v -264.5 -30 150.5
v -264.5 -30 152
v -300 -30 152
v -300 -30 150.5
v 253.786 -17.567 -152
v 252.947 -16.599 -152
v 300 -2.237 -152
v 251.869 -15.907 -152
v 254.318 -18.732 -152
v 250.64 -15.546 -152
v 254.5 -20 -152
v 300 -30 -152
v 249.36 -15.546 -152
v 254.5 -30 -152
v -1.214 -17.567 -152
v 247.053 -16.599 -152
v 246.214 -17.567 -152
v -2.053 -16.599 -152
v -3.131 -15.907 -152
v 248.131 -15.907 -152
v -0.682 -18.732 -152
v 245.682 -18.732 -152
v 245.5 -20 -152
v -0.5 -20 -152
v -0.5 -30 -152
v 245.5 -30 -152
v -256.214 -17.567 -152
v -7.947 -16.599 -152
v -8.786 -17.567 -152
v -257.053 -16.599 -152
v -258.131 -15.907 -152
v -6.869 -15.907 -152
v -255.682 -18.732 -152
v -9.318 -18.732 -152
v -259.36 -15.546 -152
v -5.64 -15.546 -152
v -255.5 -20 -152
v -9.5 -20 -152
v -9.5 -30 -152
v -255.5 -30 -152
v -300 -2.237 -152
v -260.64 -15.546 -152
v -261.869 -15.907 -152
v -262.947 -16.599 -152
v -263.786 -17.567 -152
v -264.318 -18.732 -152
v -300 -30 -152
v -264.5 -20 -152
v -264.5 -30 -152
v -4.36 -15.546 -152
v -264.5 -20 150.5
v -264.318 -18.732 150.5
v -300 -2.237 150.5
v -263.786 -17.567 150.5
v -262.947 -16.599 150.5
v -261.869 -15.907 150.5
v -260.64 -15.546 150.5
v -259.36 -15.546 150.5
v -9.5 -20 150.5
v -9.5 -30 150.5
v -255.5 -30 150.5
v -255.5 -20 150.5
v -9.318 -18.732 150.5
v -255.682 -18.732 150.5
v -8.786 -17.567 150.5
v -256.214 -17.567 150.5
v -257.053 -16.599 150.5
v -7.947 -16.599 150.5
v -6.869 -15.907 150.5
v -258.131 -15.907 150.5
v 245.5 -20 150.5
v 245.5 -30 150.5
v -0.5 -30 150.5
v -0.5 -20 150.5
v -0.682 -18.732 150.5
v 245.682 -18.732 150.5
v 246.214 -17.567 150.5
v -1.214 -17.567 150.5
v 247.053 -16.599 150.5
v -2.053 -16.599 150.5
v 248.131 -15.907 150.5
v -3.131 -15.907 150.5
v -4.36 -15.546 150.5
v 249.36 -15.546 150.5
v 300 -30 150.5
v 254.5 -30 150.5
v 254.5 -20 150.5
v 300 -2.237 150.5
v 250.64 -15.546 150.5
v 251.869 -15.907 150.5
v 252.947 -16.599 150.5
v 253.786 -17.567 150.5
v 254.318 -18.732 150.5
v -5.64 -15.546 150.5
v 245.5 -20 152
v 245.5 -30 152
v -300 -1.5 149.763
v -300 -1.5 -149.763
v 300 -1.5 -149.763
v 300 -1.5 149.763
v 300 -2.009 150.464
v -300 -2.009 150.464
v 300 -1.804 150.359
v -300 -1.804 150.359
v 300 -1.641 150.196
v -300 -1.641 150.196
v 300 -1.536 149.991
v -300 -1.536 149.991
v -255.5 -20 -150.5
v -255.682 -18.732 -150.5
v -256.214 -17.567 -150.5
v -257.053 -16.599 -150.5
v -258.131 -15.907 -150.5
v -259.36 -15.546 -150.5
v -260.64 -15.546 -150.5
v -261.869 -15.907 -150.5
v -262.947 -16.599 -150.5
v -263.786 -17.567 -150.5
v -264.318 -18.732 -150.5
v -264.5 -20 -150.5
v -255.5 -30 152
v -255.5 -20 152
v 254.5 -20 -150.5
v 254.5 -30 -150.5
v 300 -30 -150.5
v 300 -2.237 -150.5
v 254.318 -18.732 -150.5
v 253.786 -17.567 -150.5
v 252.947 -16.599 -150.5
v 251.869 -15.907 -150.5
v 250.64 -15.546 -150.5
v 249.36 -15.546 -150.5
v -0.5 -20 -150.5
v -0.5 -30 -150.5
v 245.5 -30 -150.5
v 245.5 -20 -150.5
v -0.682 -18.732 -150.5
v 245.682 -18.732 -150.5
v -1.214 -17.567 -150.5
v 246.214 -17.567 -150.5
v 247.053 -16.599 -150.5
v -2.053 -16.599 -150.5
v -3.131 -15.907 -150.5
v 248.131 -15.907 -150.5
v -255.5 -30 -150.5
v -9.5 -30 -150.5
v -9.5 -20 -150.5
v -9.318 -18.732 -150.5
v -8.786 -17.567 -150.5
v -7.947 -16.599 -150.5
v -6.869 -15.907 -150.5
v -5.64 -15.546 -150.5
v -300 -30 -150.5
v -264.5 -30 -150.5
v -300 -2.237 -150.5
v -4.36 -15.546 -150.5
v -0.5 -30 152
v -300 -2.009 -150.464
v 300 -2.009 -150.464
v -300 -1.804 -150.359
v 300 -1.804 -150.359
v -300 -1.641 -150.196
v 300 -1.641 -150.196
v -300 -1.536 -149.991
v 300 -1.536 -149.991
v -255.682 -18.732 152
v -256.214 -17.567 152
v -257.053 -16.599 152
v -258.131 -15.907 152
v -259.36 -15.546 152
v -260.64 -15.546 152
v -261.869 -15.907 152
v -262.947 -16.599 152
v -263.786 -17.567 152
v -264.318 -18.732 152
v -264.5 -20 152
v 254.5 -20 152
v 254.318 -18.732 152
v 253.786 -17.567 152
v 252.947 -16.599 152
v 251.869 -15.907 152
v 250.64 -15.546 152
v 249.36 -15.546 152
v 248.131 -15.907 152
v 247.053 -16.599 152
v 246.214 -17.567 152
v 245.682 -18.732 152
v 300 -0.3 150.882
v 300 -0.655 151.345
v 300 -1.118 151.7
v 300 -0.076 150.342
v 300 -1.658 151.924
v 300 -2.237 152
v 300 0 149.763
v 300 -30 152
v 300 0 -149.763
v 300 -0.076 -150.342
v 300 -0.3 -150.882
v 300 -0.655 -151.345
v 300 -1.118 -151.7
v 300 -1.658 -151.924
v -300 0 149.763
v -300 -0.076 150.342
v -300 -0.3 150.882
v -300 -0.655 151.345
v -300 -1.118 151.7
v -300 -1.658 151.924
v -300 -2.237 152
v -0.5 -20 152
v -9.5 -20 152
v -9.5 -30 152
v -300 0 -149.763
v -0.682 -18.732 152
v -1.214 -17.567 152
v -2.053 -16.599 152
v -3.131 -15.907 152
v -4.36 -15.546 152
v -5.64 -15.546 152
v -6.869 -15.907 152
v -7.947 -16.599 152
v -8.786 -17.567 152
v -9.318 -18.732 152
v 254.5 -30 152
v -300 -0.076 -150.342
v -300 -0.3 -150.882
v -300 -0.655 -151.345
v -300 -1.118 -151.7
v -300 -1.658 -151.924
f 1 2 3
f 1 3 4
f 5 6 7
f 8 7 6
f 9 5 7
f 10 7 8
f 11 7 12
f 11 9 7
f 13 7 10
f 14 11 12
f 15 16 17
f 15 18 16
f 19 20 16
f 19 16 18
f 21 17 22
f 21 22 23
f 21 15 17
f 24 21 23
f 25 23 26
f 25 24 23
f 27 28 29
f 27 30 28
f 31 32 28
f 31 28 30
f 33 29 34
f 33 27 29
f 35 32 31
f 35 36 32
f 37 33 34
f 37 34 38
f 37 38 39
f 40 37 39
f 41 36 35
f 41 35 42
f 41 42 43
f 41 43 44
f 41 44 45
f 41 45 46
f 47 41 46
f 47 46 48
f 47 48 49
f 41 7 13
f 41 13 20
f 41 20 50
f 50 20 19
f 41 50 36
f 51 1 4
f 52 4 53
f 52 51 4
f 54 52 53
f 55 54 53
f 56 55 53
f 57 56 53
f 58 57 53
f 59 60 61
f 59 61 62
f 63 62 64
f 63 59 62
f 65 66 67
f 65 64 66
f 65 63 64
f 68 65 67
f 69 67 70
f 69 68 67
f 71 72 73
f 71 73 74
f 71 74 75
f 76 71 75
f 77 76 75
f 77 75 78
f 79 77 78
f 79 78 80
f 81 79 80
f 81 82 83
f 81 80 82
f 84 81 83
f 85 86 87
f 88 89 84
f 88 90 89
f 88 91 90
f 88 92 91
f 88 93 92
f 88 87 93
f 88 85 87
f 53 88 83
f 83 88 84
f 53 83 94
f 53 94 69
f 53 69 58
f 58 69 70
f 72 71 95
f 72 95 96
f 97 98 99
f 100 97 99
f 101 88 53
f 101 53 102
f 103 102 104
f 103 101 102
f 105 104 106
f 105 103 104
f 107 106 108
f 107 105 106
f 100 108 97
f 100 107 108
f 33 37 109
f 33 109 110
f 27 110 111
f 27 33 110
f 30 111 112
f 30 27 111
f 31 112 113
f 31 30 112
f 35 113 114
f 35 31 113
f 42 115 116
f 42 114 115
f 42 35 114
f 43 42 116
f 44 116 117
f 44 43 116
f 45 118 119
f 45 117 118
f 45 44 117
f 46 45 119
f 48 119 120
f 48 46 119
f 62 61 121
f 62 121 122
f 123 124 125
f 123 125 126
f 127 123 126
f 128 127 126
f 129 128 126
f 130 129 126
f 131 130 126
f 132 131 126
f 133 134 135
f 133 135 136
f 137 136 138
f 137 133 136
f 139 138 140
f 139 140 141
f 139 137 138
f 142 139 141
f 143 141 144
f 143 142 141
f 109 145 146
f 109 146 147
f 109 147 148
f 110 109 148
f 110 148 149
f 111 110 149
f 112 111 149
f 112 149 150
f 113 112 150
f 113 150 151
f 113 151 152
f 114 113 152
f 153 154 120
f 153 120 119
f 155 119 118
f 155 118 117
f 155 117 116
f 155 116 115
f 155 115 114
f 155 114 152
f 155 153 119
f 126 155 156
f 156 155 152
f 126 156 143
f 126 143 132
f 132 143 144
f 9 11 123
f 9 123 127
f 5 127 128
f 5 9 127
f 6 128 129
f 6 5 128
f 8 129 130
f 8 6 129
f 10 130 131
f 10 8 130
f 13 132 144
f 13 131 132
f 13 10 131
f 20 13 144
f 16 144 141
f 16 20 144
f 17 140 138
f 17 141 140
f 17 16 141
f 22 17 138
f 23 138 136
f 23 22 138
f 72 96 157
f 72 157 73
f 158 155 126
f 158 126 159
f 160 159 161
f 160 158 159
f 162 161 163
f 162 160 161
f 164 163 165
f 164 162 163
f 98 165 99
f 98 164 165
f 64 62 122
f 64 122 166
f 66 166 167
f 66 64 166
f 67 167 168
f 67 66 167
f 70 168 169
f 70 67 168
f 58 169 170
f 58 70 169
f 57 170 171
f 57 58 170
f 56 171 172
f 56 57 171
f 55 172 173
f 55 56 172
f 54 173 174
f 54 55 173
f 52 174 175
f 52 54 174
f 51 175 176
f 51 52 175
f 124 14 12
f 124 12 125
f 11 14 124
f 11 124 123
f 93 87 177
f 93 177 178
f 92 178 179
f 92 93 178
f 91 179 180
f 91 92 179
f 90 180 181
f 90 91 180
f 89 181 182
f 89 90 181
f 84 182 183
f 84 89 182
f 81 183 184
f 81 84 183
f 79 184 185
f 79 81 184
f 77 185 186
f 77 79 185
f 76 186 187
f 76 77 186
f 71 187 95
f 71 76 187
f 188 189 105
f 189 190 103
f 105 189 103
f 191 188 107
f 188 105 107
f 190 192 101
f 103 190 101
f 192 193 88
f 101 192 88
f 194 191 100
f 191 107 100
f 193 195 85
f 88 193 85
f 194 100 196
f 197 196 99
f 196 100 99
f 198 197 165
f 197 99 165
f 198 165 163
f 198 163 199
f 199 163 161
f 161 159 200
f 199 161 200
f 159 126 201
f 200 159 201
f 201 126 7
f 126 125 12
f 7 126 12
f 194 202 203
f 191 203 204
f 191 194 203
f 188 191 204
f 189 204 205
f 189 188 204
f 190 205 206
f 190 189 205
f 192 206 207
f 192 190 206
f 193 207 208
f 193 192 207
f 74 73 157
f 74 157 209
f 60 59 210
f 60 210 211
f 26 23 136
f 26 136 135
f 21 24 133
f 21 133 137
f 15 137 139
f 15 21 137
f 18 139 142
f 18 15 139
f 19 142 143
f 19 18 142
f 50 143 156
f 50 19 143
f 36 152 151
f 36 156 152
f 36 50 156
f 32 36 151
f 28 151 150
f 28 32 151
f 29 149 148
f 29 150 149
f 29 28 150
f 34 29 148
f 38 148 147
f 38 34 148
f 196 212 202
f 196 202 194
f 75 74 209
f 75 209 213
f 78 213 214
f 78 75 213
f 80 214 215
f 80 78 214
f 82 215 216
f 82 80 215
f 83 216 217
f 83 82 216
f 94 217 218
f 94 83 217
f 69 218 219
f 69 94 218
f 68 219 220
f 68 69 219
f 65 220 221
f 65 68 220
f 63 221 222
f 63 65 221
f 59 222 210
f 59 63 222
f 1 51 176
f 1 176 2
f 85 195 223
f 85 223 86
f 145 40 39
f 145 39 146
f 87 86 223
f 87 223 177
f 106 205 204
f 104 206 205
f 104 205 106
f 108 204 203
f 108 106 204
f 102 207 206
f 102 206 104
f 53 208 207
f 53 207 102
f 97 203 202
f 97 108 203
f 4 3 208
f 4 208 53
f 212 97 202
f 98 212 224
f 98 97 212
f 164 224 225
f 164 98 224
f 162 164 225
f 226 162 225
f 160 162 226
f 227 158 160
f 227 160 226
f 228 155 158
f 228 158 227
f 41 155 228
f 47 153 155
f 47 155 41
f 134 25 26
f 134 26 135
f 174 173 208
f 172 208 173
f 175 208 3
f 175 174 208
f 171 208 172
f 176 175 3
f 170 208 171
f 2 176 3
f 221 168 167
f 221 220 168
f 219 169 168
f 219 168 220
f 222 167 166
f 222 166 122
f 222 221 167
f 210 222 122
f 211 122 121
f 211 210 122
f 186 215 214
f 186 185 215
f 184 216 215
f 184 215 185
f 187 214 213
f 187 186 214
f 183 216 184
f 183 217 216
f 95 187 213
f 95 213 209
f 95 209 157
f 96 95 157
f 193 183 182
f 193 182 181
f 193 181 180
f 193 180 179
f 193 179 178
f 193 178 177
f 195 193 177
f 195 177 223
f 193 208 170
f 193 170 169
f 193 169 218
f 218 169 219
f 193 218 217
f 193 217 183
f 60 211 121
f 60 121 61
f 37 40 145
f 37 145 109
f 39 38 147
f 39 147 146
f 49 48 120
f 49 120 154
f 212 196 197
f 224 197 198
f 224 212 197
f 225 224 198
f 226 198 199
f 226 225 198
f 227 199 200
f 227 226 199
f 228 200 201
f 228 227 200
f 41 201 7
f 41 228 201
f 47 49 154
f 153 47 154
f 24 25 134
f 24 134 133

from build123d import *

# Parameters (mm, degrees)
SKETCH_1_W                         = 600
SKETCH_1_H                         = 304
SM_BASE_FLANGE_1_DEPTH             = 1.5
SM_EDGE_FLANGE_1_STRIP_W           = 7.4732
SM_EDGE_FLANGE_1_STRIP_H           = 1.5
SM_EDGE_FLANGE_1_STRIP_CUT_DEPTH   = 600
SM_EDGE_FLANGE_1_STRIP_2_W         = 7.4732
SM_EDGE_FLANGE_1_STRIP_2_H         = 1.5
SM_EDGE_FLANGE_1_STRIP_CUT_2_DEPTH = 600
SM_EDGE_FLANGE_1_DEPTH             = 600
SM_EDGE_FLANGE_1_BEND_DEPTH        = 600
CUT_EXTRUDE_1_DEPTH                = 429.154177838
PATTERN_LINEAR_1_COUNT             = 3
PATTERN_LINEAR_1_PITCH             = 255


# Sheet-metal steps are written as plain solids
with BuildPart() as part:
    # Sketch 1 → 基体-法兰1 (new body)
    with BuildSketch(Plane(origin=(0, 0, 0), x_dir=(1, 0, 0), z_dir=(0, 1, 0))):
        Rectangle(SKETCH_1_W, SKETCH_1_H)
    extrude(amount=-SM_BASE_FLANGE_1_DEPTH)

    # 边线-法兰1 strip (across the edge) → 边线-法兰1 strip cut (cut)
    with BuildSketch(Plane(origin=(300, -1.5, 152), x_dir=(0, 0, -1), z_dir=(-1, 0, 0))):
        with Locations((-1.5, -0.75)):
            Rectangle(SM_EDGE_FLANGE_1_STRIP_W, SM_EDGE_FLANGE_1_STRIP_H)
    extrude(amount=SM_EDGE_FLANGE_1_STRIP_CUT_DEPTH, mode=Mode.SUBTRACT)

    # 边线-法兰1 strip 2 (across the edge) → 边线-法兰1 strip cut 2 (cut)
    with BuildSketch(Plane(origin=(-300, -1.5, -152), x_dir=(0, 0, 1), z_dir=(1, 0, 0))):
        with Locations((-1.5, -0.75)):
            Rectangle(SM_EDGE_FLANGE_1_STRIP_2_W, SM_EDGE_FLANGE_1_STRIP_2_H)
    extrude(amount=SM_EDGE_FLANGE_1_STRIP_CUT_2_DEPTH, mode=Mode.SUBTRACT)

    # 边线-法兰1 section (across the edge) → 边线-法兰1 (add)
    with BuildSketch(Plane(origin=(300, -1.5, 152), x_dir=(0, 0, -1), z_dir=(-1, 0, 0))):
        with BuildLine():
            Line((0, 0.7366), (0, 28.5))
            Line((0, 28.5), (1.5, 28.5))
            Line((1.5, 28.5), (1.5, 0.7366))
            ThreePointArc((1.5, 0.7366), (1.715745145, 0.215745145), (2.2366, 0))
            Line((2.2366, 0), (2.2366, -1.5))
            ThreePointArc((2.2366, -1.5), (0.655084973, -0.844915027), (0, 0.7366))
        make_face()
    extrude(amount=SM_EDGE_FLANGE_1_DEPTH)

    # 边线-法兰1 section 2 (across the edge) → 边线-法兰1 bend (add)
    with BuildSketch(Plane(origin=(-300, -1.5, -152), x_dir=(0, 0, 1), z_dir=(1, 0, 0))):
        with BuildLine():
            Line((0, 0.7366), (0, 28.5))
            Line((0, 28.5), (1.5, 28.5))
            Line((1.5, 28.5), (1.5, 0.7366))
            ThreePointArc((1.5, 0.7366), (1.715745145, 0.215745145), (2.2366, 0))
            Line((2.2366, 0), (2.2366, -1.5))
            ThreePointArc((2.2366, -1.5), (0.655084973, -0.844915027), (0, 0.7366))
        make_face()
    extrude(amount=SM_EDGE_FLANGE_1_BEND_DEPTH)

    # 草图12 → 切除-拉伸1 (cut, through all)
    with BuildSketch(Plane(origin=(0, 0, -152), x_dir=(-1, 0, 0), z_dir=(0, 0, -1))):
        with BuildLine():
            Line((-254.5, -30), (-254.5, -20))
            ThreePointArc((-254.5, -20), (-250, -15.5), (-245.5, -20))
            Line((-245.5, -20), (-245.5, -30))
            ThreePointArc((-245.5, -30), (-250, -34.5), (-254.5, -30))
        make_face()
    cut_extrude_1 = extrude(amount=-CUT_EXTRUDE_1_DEPTH, mode=Mode.SUBTRACT)

    # 阵列(线性)1: 切除-拉伸1 ×3
    with Locations(*[(-i * PATTERN_LINEAR_1_PITCH, 0, 0) for i in range(1, PATTERN_LINEAR_1_COUNT)]):
        add(cut_extrude_1, mode=Mode.SUBTRACT)


solid = part.part
